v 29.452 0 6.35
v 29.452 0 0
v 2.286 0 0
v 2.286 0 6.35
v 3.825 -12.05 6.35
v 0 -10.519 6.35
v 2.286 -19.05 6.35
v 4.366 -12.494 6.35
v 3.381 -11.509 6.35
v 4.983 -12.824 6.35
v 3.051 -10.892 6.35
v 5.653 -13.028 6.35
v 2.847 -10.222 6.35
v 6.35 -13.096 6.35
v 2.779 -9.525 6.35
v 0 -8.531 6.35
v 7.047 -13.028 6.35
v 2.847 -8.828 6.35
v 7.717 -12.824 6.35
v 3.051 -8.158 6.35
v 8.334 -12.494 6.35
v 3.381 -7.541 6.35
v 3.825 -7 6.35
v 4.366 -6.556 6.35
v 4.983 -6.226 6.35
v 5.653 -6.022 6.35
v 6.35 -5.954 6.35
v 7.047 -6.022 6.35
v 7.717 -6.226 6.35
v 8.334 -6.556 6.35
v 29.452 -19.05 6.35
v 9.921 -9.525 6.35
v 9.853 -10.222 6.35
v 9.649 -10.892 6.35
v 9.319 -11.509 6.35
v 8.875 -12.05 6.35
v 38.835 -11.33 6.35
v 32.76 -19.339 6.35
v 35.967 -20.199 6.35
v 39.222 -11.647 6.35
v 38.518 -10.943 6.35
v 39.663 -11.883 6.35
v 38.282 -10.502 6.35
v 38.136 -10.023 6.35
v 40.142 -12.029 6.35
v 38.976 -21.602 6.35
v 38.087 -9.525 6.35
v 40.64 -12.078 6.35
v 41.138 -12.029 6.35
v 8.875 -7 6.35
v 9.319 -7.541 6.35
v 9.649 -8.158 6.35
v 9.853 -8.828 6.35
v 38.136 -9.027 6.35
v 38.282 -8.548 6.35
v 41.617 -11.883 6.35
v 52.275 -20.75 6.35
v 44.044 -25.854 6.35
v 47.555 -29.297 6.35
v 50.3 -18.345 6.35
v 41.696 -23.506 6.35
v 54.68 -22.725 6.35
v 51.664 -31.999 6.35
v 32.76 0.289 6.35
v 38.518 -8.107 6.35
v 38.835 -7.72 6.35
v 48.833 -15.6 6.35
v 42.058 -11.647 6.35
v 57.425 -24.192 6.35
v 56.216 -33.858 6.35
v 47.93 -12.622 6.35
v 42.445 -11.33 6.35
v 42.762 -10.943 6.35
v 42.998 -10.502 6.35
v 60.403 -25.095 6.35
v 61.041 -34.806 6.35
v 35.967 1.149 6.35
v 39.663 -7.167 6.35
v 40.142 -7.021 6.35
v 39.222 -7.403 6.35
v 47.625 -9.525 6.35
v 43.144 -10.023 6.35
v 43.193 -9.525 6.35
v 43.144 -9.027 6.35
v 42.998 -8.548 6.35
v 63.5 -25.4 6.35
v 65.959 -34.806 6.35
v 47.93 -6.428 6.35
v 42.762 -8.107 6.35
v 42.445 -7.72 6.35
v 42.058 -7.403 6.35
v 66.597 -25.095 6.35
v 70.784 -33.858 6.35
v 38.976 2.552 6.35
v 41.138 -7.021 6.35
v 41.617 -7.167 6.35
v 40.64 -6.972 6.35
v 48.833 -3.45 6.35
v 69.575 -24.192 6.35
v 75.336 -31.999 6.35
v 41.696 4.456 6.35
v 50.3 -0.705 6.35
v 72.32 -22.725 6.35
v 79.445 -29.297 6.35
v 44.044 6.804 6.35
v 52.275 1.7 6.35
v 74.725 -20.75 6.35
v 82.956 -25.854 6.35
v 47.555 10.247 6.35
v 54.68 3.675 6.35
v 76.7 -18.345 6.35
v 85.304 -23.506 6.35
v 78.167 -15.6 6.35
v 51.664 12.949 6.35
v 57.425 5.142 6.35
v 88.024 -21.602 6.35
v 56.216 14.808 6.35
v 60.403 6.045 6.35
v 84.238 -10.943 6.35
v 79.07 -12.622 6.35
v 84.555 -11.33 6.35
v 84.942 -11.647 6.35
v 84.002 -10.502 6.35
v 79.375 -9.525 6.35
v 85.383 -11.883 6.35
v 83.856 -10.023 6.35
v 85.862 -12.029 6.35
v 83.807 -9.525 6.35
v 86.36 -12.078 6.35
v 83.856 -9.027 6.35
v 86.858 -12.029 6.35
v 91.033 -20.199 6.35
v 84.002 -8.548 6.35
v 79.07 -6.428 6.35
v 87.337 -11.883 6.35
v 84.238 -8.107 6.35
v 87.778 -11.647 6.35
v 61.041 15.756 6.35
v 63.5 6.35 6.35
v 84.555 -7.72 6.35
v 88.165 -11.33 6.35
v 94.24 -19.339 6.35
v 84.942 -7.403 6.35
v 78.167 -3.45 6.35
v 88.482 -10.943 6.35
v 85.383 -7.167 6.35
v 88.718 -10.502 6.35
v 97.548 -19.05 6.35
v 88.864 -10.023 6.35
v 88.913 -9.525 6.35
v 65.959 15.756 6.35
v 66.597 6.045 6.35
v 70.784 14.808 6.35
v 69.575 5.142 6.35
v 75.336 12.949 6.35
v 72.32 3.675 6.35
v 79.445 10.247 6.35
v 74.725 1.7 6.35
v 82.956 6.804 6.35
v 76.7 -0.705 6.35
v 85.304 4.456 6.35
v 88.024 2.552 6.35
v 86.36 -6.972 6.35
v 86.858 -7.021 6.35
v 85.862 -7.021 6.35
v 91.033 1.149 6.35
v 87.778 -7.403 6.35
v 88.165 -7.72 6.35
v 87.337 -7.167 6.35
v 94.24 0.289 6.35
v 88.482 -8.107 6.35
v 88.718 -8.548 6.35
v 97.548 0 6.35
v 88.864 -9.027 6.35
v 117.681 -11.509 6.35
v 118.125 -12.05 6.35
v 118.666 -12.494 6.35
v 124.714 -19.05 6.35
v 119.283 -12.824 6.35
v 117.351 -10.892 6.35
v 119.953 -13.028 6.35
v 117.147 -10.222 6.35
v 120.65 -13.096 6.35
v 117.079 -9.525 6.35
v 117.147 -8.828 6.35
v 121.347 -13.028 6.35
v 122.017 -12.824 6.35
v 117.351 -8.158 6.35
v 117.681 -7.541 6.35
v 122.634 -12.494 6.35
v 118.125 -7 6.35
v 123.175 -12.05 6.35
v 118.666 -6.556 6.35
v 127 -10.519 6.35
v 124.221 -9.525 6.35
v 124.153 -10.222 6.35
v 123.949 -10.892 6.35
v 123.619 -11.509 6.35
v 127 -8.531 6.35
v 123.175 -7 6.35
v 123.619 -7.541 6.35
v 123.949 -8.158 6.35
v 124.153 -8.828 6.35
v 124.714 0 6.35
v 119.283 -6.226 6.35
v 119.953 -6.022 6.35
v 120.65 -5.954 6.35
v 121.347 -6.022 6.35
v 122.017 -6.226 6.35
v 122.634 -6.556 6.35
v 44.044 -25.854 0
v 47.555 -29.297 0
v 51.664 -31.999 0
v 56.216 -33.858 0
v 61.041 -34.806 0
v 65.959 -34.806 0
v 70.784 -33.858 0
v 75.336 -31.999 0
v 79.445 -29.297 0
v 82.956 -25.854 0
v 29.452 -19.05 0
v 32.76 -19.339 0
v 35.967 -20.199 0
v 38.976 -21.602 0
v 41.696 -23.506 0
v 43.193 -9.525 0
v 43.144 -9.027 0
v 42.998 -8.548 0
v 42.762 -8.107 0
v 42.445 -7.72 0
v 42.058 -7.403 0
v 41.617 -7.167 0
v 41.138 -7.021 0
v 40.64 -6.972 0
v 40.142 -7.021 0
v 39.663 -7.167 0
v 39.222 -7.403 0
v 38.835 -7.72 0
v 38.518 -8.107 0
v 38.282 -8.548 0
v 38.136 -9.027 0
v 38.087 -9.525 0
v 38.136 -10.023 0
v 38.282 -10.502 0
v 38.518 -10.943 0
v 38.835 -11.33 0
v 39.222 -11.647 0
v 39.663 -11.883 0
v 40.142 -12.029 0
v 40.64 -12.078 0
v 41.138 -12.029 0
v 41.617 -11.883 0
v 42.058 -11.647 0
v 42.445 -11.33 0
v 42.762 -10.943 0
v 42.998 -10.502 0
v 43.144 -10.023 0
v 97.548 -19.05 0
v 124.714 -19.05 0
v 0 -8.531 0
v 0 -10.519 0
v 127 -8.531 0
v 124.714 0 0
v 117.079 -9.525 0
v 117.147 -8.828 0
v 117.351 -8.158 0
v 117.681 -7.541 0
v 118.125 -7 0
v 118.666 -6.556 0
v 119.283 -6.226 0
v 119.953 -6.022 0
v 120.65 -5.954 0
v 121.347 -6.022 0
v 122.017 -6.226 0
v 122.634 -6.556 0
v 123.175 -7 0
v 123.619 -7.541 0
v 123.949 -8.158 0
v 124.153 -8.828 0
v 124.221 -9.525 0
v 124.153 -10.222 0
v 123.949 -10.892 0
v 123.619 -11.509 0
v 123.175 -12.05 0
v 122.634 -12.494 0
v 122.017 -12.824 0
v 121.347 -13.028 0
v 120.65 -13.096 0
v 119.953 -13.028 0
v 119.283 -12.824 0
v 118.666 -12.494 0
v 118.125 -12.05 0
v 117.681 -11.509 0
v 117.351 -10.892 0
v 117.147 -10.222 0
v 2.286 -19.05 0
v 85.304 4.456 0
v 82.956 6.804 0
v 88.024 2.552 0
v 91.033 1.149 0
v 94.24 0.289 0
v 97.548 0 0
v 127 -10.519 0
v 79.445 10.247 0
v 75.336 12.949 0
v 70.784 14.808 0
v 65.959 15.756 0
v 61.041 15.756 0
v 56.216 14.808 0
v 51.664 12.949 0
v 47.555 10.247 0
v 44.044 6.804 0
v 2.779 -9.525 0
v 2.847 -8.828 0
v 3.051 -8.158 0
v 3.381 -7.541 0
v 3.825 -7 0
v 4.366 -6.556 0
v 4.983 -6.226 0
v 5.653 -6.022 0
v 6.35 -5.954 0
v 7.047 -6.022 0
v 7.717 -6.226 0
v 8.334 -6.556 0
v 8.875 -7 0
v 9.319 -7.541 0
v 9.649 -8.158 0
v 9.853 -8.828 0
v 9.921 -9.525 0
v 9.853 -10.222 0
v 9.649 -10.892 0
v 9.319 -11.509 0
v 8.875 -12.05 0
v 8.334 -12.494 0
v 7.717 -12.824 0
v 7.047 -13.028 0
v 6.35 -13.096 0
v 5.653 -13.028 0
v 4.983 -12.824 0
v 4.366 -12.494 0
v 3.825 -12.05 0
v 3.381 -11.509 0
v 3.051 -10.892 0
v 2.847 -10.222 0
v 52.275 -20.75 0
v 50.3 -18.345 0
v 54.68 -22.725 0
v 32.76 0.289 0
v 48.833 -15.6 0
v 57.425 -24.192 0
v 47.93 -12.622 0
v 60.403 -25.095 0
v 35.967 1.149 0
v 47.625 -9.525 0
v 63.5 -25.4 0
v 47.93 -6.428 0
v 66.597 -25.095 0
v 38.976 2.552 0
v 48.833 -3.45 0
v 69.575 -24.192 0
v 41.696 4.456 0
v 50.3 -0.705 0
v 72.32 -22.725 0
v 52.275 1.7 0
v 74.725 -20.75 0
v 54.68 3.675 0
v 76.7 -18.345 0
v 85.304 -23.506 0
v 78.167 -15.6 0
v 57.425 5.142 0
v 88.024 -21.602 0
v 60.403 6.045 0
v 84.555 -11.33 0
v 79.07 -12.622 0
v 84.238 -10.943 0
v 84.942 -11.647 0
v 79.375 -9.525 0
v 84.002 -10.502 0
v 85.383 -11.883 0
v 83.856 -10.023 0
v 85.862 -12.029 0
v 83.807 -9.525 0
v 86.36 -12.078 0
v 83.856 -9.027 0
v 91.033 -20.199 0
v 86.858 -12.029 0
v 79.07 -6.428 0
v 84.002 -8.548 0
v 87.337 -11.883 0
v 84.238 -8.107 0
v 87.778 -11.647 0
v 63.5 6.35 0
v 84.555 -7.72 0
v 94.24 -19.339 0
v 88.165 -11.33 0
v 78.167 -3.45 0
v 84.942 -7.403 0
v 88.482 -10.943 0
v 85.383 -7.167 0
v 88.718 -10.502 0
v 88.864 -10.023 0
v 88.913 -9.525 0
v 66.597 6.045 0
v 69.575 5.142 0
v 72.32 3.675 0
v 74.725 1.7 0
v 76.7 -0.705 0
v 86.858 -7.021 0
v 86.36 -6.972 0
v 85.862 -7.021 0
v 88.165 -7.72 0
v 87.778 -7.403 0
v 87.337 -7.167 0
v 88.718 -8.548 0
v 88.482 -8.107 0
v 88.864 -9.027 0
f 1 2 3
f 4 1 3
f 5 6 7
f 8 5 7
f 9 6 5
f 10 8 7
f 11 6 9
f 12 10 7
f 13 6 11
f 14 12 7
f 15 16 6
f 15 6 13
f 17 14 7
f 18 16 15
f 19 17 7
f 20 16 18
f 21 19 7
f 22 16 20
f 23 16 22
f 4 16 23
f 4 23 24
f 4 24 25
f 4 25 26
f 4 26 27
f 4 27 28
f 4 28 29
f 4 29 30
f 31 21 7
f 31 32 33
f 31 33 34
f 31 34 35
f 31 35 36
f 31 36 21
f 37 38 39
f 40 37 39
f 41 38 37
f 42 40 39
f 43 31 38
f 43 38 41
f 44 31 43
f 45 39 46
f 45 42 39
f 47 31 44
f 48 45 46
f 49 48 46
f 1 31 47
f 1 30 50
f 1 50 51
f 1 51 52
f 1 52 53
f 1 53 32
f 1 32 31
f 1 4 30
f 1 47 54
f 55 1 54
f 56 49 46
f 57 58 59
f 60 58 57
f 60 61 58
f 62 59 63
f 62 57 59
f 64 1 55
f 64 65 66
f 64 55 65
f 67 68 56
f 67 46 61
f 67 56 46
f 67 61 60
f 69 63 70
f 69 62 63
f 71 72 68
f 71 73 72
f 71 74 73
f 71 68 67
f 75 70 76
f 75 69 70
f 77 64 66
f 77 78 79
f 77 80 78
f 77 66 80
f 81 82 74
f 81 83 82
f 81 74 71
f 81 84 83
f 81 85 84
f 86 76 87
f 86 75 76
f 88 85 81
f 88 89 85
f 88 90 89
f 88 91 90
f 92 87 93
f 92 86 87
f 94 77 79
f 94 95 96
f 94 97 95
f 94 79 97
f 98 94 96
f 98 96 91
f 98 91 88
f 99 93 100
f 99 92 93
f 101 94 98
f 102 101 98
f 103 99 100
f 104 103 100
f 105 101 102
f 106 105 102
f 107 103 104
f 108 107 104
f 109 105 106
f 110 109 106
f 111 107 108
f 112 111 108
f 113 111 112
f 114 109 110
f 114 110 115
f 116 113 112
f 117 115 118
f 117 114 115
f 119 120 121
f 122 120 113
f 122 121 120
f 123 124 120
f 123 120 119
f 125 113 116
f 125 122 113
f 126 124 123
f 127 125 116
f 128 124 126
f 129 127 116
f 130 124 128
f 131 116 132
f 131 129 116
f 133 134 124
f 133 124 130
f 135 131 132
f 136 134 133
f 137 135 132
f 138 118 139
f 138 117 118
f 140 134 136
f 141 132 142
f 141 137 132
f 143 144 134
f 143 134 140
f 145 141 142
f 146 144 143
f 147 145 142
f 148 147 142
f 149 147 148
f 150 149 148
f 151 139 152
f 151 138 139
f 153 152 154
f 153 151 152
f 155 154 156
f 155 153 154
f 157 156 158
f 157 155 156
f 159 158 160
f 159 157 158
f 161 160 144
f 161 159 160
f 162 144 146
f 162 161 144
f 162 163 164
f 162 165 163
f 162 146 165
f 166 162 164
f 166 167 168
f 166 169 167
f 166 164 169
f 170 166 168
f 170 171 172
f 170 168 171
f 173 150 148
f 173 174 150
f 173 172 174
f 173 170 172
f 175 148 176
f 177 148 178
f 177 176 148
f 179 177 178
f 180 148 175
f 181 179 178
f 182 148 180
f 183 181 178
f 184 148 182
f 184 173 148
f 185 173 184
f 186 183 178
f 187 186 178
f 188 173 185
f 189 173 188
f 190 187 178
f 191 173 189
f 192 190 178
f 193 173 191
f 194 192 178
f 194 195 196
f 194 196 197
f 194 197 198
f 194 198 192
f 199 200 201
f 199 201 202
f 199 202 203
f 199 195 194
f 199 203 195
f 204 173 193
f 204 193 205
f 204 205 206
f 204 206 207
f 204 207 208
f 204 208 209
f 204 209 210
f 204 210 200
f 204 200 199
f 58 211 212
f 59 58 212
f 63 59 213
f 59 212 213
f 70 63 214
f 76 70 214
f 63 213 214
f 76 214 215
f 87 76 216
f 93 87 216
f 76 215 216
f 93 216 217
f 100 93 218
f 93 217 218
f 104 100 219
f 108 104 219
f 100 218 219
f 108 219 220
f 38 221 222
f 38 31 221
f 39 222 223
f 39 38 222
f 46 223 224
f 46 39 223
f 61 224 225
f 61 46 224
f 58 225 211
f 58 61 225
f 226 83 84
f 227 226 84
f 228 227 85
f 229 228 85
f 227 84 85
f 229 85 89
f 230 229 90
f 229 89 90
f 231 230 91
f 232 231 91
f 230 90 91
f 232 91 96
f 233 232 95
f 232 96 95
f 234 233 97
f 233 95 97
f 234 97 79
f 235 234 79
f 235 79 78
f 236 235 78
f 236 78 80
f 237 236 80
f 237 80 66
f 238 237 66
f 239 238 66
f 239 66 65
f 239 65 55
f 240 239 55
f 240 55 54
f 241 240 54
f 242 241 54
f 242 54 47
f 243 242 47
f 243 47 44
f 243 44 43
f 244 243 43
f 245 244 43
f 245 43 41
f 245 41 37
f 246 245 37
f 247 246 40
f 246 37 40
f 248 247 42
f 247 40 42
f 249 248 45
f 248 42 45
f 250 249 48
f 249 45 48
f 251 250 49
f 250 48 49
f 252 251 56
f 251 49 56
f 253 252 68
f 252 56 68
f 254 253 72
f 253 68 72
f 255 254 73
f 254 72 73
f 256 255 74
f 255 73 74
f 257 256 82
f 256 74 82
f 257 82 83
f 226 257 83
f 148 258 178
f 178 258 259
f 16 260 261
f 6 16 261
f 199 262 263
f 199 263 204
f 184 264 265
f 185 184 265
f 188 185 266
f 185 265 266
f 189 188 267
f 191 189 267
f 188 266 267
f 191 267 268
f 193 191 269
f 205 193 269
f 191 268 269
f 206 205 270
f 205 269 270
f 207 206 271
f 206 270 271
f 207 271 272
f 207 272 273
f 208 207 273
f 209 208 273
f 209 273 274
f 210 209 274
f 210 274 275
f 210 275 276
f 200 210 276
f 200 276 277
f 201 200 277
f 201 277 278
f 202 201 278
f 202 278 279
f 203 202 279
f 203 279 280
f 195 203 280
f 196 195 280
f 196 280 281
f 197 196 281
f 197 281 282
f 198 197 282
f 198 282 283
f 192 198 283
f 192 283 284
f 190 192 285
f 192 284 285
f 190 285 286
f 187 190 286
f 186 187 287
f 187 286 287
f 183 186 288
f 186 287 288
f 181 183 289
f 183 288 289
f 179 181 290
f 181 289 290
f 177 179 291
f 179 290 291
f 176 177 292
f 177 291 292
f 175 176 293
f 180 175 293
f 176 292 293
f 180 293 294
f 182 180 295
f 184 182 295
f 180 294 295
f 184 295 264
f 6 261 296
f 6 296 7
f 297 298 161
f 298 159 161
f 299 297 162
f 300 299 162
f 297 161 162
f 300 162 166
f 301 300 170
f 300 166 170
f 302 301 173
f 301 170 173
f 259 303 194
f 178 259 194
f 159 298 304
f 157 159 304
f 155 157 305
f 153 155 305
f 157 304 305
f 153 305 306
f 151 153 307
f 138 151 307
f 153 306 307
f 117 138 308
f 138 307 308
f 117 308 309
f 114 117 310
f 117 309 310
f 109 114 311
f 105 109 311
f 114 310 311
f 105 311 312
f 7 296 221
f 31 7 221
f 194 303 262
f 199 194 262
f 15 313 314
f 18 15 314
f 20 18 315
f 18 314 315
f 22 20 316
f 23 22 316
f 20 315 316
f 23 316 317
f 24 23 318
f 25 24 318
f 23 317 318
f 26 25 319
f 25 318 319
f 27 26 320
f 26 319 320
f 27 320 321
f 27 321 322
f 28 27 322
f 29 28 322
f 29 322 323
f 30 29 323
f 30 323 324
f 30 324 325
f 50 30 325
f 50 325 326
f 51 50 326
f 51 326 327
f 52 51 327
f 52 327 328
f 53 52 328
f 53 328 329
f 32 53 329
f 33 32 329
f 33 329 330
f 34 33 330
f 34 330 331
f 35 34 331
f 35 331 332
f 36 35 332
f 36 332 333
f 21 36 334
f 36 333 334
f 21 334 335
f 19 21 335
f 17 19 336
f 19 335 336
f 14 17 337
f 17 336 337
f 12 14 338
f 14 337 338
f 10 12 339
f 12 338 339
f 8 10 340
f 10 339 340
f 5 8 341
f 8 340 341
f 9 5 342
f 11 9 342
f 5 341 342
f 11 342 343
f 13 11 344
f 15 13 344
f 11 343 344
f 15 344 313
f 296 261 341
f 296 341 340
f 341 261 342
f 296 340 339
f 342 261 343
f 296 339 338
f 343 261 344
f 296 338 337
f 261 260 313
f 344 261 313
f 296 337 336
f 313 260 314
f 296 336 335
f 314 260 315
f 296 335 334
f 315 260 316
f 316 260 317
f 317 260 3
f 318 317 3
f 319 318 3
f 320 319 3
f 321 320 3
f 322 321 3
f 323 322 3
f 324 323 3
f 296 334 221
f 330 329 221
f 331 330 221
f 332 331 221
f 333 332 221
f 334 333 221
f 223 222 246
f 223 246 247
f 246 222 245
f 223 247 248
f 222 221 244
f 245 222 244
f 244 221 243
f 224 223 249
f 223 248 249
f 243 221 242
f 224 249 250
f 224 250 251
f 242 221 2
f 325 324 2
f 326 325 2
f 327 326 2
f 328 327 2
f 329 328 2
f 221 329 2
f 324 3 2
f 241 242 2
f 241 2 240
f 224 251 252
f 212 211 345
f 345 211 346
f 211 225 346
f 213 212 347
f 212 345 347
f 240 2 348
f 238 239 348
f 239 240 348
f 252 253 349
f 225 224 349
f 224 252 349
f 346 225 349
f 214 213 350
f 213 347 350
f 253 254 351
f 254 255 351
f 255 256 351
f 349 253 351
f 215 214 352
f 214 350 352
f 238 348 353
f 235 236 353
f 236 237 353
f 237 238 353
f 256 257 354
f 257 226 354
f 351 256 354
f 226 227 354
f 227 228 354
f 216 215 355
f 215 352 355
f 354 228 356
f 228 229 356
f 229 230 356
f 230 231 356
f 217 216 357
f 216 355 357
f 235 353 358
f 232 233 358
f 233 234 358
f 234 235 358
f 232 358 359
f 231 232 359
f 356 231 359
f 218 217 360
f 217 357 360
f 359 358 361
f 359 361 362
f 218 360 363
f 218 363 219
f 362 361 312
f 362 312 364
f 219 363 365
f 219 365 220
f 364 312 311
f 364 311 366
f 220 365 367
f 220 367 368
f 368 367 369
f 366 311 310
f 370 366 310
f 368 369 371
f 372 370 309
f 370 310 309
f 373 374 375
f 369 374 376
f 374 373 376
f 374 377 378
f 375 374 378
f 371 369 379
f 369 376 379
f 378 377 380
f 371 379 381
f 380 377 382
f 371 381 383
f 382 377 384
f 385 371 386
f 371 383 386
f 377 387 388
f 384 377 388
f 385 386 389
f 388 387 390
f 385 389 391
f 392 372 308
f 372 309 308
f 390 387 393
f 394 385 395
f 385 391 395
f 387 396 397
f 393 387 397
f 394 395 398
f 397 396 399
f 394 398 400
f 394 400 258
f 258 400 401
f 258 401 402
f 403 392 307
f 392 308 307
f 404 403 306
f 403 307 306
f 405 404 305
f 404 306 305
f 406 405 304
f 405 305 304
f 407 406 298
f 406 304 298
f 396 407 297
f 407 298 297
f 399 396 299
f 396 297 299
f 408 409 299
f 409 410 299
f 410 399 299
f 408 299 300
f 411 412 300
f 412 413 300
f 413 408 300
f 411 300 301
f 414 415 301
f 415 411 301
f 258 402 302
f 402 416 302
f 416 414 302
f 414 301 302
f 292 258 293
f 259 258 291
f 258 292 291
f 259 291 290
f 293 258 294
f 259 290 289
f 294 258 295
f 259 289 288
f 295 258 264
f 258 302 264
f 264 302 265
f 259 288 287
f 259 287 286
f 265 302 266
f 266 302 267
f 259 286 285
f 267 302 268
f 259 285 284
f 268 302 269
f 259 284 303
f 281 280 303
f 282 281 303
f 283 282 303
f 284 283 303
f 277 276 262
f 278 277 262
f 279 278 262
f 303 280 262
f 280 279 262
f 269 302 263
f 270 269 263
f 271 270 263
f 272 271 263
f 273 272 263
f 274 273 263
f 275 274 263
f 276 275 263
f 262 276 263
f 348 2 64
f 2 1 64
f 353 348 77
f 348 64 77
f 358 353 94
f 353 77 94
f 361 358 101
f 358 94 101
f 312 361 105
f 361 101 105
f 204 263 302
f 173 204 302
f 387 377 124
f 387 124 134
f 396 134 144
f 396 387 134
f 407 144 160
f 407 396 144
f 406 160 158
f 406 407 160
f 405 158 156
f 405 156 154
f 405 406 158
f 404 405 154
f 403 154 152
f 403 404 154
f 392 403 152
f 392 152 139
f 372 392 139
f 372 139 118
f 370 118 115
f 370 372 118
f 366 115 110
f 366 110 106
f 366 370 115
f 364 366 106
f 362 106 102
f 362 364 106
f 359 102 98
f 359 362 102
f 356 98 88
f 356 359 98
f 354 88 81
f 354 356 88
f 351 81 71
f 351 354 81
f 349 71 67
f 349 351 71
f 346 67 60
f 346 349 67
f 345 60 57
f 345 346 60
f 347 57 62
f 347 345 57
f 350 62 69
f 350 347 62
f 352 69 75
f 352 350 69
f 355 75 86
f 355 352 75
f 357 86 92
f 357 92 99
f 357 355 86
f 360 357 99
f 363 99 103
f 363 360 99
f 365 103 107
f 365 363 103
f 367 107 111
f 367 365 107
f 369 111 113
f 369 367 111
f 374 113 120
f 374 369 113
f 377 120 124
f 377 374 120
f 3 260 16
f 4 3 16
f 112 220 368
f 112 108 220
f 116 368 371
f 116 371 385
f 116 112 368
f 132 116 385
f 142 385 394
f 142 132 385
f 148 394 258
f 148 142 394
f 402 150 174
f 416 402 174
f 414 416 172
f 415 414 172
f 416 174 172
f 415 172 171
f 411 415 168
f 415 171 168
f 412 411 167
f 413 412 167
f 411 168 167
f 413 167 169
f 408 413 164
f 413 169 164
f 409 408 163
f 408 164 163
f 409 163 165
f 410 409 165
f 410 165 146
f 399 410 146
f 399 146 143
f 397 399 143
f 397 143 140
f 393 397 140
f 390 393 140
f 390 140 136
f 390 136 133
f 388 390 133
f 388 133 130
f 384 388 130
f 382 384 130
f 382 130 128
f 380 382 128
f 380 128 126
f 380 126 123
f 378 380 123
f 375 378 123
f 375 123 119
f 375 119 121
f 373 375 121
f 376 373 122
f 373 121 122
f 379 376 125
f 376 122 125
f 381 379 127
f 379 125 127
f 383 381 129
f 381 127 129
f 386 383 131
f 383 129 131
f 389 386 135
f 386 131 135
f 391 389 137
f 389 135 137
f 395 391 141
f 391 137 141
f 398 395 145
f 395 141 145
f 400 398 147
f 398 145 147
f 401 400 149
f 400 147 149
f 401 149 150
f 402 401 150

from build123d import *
from OCP.BRepFilletAPI import BRepFilletAPI_MakeChamfer

# Parameters (mm, degrees)
SKETCH1_R                   = 15.875
EXTRUDE1_DEPTH              = 6.35
CHAMFER1_SIZE               = 2.286
CHAMFER1_SIZE2              = 8.531468146
F_1_4_CLEARANCE_HOLE1_D     = 7.14248
F_1_4_20_TAPPED_HOLE1_D     = 5.1054
F_1_4_20_TAPPED_HOLE1_DEPTH = 16.51
F_1_4_20_TAPPED_HOLE1_TIP   = 1.533816902
FILLET1_R                   = 19.05


with BuildPart() as part:
    # Sketch1 → Extrude1 (new body)
    with BuildSketch(Plane.XY):
        with BuildLine():
            Line((0, 0), (0, -19.05))
            Line((0, -19.05), (39.953569803, -19.05))
            ThreePointArc((39.953569803, -19.05), (63.5, -34.925), (87.046430197, -19.05))
            Line((87.046430197, -19.05), (127, -19.05))
            Line((127, -19.05), (127, 0))
            Line((127, 0), (87.046430197, 0))
            ThreePointArc((87.046430197, 0), (63.5, 15.875), (39.953569803, 0))
            Line((39.953569803, 0), (0, 0))
        make_face()
        with Locations((63.5, -9.525)):
            Circle(SKETCH1_R, mode=Mode.SUBTRACT)
    extrude(amount=EXTRUDE1_DEPTH)

    # Chamfer1: one chamfer whose edges measure the first distance from different faces: ONE call of the kernel's chamfer builder (chamfer() names one face for all edges)
    chamfer1_edges_1 = [part.edges().sort_by_distance(p)[0] for p in [
        (127, 0, 3.175),
    ]]
    chamfer1_side_1 = [part.faces().sort_by_distance(p)[0] for p in [
        (107.023215098, 0, 3.175),
    ]]
    chamfer1_edges_2 = [part.edges().sort_by_distance(p)[0] for p in [
        (127, -19.05, 3.175),
    ]]
    chamfer1_side_2 = [part.faces().sort_by_distance(p)[0] for p in [
        (107.023215098, -19.05, 3.175),
    ]]
    chamfer1_edges_3 = [part.edges().sort_by_distance(p)[0] for p in [
        (0, -19.05, 3.175),
    ]]
    chamfer1_side_3 = [part.faces().sort_by_distance(p)[0] for p in [
        (19.976784902, -19.05, 3.175),
    ]]
    chamfer1_edges_4 = [part.edges().sort_by_distance(p)[0] for p in [
        (0, 0, 3.175),
    ]]
    chamfer1_side_4 = [part.faces().sort_by_distance(p)[0] for p in [
        (19.976784902, 0, 3.175),
    ]]
    chamfer1 = BRepFilletAPI_MakeChamfer(part.part.solid().wrapped)
    for e in chamfer1_edges_1:
        chamfer1.Add(CHAMFER1_SIZE, CHAMFER1_SIZE2, e.wrapped, chamfer1_side_1[0].wrapped)  # the first distance lies on this face
    for e in chamfer1_edges_2:
        chamfer1.Add(CHAMFER1_SIZE, CHAMFER1_SIZE2, e.wrapped, chamfer1_side_2[0].wrapped)  # the first distance lies on this face
    for e in chamfer1_edges_3:
        chamfer1.Add(CHAMFER1_SIZE, CHAMFER1_SIZE2, e.wrapped, chamfer1_side_3[0].wrapped)  # the first distance lies on this face
    for e in chamfer1_edges_4:
        chamfer1.Add(CHAMFER1_SIZE, CHAMFER1_SIZE2, e.wrapped, chamfer1_side_4[0].wrapped)  # the first distance lies on this face
    add(Compound.cast(chamfer1.Shape()), mode=Mode.REPLACE)

    # 1/4 Clearance Hole1 (through all)
    with Locations(Plane(origin=(6.35, -9.525, 6.35), x_dir=(1, 0, 0), z_dir=(0, 0, 1))):
        with Locations((0, 0), (114.3, 0)):
            Hole(F_1_4_CLEARANCE_HOLE1_D / 2)

    # 1/4-20 Tapped Hole1
    with Locations(Plane(origin=(40.64, -9.525, 0), x_dir=(-1, 0, 0), z_dir=(0, 0, -1))):
        with Locations((0, 0), (-45.72, 0)):
            Hole(F_1_4_20_TAPPED_HOLE1_D / 2, depth=F_1_4_20_TAPPED_HOLE1_DEPTH)
            with Locations((0, 0, -(F_1_4_20_TAPPED_HOLE1_DEPTH + F_1_4_20_TAPPED_HOLE1_TIP / 2))):  # 118° drill point
                Cone(0, F_1_4_20_TAPPED_HOLE1_D / 2, F_1_4_20_TAPPED_HOLE1_TIP, mode=Mode.SUBTRACT)

    # Fillet1
    fillet1_edges = [part.edges().sort_by_distance(p)[0] for p in [
        (39.953569803, 0, 3.175),
        (87.046430197, 0, 3.175),
        (87.046430197, -19.05, 3.175),
        (39.953569803, -19.05, 3.175),
    ]]
    fillet(fillet1_edges, radius=FILLET1_R)


solid = part.part
